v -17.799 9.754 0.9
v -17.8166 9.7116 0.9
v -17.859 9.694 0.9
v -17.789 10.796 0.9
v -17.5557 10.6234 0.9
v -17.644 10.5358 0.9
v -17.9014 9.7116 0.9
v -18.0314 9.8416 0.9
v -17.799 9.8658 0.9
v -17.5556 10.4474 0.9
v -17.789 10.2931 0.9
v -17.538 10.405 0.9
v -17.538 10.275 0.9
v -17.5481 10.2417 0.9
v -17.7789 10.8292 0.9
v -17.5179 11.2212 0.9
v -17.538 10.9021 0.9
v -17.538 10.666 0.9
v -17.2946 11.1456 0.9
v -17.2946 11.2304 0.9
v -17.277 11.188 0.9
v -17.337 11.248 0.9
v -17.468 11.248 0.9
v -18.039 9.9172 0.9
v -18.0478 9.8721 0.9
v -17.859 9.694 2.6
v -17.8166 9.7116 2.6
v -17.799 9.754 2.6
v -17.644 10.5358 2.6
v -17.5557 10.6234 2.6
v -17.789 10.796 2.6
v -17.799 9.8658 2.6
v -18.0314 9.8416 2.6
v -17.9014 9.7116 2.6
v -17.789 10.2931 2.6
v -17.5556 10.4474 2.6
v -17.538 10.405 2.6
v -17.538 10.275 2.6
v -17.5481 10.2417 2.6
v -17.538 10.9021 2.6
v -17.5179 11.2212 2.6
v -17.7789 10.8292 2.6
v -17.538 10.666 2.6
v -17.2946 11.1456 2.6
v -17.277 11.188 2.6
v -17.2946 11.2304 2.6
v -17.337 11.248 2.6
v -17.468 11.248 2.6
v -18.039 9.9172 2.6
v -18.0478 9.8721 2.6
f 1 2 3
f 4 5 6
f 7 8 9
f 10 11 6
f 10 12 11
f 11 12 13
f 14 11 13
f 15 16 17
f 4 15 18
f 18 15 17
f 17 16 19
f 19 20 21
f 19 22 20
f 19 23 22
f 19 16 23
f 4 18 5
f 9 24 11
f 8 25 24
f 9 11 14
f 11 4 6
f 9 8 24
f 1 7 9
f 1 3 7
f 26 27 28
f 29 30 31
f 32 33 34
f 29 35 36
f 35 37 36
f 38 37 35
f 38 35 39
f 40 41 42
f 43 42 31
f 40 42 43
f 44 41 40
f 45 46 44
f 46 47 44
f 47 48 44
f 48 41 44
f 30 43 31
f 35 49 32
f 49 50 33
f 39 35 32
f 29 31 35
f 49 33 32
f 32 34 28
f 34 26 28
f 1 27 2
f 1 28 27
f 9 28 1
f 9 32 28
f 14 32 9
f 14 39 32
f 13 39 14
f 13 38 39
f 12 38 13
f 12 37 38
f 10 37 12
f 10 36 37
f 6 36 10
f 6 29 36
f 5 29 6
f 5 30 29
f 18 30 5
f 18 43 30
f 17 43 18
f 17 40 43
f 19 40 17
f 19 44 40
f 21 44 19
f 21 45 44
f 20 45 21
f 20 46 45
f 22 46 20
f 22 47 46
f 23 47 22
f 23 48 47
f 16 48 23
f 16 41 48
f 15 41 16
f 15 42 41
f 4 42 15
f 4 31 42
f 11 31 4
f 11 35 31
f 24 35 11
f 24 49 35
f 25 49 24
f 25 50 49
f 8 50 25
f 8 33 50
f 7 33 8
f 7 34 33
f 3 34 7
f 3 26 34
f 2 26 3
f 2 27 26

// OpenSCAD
$fn = 24;
translate([0, -2.500, 0.900])
  linear_extrude(height=1.700) {
offset(r=0.06, $fn=8) {
    polygon(points=[[-17.337,13.688],[-17.468,13.688],[-17.729,13.296],[-17.729,12.775],[-17.989,12.384],[-17.859,12.254],[-17.859,12.384],[-17.598,12.775],[-17.598,12.905],[-17.729,13.036],[-17.598,13.166],[-17.598,13.427]], paths=[[0,1,2,3,4,5,6,7,8,9,10,11]]);
}
}
